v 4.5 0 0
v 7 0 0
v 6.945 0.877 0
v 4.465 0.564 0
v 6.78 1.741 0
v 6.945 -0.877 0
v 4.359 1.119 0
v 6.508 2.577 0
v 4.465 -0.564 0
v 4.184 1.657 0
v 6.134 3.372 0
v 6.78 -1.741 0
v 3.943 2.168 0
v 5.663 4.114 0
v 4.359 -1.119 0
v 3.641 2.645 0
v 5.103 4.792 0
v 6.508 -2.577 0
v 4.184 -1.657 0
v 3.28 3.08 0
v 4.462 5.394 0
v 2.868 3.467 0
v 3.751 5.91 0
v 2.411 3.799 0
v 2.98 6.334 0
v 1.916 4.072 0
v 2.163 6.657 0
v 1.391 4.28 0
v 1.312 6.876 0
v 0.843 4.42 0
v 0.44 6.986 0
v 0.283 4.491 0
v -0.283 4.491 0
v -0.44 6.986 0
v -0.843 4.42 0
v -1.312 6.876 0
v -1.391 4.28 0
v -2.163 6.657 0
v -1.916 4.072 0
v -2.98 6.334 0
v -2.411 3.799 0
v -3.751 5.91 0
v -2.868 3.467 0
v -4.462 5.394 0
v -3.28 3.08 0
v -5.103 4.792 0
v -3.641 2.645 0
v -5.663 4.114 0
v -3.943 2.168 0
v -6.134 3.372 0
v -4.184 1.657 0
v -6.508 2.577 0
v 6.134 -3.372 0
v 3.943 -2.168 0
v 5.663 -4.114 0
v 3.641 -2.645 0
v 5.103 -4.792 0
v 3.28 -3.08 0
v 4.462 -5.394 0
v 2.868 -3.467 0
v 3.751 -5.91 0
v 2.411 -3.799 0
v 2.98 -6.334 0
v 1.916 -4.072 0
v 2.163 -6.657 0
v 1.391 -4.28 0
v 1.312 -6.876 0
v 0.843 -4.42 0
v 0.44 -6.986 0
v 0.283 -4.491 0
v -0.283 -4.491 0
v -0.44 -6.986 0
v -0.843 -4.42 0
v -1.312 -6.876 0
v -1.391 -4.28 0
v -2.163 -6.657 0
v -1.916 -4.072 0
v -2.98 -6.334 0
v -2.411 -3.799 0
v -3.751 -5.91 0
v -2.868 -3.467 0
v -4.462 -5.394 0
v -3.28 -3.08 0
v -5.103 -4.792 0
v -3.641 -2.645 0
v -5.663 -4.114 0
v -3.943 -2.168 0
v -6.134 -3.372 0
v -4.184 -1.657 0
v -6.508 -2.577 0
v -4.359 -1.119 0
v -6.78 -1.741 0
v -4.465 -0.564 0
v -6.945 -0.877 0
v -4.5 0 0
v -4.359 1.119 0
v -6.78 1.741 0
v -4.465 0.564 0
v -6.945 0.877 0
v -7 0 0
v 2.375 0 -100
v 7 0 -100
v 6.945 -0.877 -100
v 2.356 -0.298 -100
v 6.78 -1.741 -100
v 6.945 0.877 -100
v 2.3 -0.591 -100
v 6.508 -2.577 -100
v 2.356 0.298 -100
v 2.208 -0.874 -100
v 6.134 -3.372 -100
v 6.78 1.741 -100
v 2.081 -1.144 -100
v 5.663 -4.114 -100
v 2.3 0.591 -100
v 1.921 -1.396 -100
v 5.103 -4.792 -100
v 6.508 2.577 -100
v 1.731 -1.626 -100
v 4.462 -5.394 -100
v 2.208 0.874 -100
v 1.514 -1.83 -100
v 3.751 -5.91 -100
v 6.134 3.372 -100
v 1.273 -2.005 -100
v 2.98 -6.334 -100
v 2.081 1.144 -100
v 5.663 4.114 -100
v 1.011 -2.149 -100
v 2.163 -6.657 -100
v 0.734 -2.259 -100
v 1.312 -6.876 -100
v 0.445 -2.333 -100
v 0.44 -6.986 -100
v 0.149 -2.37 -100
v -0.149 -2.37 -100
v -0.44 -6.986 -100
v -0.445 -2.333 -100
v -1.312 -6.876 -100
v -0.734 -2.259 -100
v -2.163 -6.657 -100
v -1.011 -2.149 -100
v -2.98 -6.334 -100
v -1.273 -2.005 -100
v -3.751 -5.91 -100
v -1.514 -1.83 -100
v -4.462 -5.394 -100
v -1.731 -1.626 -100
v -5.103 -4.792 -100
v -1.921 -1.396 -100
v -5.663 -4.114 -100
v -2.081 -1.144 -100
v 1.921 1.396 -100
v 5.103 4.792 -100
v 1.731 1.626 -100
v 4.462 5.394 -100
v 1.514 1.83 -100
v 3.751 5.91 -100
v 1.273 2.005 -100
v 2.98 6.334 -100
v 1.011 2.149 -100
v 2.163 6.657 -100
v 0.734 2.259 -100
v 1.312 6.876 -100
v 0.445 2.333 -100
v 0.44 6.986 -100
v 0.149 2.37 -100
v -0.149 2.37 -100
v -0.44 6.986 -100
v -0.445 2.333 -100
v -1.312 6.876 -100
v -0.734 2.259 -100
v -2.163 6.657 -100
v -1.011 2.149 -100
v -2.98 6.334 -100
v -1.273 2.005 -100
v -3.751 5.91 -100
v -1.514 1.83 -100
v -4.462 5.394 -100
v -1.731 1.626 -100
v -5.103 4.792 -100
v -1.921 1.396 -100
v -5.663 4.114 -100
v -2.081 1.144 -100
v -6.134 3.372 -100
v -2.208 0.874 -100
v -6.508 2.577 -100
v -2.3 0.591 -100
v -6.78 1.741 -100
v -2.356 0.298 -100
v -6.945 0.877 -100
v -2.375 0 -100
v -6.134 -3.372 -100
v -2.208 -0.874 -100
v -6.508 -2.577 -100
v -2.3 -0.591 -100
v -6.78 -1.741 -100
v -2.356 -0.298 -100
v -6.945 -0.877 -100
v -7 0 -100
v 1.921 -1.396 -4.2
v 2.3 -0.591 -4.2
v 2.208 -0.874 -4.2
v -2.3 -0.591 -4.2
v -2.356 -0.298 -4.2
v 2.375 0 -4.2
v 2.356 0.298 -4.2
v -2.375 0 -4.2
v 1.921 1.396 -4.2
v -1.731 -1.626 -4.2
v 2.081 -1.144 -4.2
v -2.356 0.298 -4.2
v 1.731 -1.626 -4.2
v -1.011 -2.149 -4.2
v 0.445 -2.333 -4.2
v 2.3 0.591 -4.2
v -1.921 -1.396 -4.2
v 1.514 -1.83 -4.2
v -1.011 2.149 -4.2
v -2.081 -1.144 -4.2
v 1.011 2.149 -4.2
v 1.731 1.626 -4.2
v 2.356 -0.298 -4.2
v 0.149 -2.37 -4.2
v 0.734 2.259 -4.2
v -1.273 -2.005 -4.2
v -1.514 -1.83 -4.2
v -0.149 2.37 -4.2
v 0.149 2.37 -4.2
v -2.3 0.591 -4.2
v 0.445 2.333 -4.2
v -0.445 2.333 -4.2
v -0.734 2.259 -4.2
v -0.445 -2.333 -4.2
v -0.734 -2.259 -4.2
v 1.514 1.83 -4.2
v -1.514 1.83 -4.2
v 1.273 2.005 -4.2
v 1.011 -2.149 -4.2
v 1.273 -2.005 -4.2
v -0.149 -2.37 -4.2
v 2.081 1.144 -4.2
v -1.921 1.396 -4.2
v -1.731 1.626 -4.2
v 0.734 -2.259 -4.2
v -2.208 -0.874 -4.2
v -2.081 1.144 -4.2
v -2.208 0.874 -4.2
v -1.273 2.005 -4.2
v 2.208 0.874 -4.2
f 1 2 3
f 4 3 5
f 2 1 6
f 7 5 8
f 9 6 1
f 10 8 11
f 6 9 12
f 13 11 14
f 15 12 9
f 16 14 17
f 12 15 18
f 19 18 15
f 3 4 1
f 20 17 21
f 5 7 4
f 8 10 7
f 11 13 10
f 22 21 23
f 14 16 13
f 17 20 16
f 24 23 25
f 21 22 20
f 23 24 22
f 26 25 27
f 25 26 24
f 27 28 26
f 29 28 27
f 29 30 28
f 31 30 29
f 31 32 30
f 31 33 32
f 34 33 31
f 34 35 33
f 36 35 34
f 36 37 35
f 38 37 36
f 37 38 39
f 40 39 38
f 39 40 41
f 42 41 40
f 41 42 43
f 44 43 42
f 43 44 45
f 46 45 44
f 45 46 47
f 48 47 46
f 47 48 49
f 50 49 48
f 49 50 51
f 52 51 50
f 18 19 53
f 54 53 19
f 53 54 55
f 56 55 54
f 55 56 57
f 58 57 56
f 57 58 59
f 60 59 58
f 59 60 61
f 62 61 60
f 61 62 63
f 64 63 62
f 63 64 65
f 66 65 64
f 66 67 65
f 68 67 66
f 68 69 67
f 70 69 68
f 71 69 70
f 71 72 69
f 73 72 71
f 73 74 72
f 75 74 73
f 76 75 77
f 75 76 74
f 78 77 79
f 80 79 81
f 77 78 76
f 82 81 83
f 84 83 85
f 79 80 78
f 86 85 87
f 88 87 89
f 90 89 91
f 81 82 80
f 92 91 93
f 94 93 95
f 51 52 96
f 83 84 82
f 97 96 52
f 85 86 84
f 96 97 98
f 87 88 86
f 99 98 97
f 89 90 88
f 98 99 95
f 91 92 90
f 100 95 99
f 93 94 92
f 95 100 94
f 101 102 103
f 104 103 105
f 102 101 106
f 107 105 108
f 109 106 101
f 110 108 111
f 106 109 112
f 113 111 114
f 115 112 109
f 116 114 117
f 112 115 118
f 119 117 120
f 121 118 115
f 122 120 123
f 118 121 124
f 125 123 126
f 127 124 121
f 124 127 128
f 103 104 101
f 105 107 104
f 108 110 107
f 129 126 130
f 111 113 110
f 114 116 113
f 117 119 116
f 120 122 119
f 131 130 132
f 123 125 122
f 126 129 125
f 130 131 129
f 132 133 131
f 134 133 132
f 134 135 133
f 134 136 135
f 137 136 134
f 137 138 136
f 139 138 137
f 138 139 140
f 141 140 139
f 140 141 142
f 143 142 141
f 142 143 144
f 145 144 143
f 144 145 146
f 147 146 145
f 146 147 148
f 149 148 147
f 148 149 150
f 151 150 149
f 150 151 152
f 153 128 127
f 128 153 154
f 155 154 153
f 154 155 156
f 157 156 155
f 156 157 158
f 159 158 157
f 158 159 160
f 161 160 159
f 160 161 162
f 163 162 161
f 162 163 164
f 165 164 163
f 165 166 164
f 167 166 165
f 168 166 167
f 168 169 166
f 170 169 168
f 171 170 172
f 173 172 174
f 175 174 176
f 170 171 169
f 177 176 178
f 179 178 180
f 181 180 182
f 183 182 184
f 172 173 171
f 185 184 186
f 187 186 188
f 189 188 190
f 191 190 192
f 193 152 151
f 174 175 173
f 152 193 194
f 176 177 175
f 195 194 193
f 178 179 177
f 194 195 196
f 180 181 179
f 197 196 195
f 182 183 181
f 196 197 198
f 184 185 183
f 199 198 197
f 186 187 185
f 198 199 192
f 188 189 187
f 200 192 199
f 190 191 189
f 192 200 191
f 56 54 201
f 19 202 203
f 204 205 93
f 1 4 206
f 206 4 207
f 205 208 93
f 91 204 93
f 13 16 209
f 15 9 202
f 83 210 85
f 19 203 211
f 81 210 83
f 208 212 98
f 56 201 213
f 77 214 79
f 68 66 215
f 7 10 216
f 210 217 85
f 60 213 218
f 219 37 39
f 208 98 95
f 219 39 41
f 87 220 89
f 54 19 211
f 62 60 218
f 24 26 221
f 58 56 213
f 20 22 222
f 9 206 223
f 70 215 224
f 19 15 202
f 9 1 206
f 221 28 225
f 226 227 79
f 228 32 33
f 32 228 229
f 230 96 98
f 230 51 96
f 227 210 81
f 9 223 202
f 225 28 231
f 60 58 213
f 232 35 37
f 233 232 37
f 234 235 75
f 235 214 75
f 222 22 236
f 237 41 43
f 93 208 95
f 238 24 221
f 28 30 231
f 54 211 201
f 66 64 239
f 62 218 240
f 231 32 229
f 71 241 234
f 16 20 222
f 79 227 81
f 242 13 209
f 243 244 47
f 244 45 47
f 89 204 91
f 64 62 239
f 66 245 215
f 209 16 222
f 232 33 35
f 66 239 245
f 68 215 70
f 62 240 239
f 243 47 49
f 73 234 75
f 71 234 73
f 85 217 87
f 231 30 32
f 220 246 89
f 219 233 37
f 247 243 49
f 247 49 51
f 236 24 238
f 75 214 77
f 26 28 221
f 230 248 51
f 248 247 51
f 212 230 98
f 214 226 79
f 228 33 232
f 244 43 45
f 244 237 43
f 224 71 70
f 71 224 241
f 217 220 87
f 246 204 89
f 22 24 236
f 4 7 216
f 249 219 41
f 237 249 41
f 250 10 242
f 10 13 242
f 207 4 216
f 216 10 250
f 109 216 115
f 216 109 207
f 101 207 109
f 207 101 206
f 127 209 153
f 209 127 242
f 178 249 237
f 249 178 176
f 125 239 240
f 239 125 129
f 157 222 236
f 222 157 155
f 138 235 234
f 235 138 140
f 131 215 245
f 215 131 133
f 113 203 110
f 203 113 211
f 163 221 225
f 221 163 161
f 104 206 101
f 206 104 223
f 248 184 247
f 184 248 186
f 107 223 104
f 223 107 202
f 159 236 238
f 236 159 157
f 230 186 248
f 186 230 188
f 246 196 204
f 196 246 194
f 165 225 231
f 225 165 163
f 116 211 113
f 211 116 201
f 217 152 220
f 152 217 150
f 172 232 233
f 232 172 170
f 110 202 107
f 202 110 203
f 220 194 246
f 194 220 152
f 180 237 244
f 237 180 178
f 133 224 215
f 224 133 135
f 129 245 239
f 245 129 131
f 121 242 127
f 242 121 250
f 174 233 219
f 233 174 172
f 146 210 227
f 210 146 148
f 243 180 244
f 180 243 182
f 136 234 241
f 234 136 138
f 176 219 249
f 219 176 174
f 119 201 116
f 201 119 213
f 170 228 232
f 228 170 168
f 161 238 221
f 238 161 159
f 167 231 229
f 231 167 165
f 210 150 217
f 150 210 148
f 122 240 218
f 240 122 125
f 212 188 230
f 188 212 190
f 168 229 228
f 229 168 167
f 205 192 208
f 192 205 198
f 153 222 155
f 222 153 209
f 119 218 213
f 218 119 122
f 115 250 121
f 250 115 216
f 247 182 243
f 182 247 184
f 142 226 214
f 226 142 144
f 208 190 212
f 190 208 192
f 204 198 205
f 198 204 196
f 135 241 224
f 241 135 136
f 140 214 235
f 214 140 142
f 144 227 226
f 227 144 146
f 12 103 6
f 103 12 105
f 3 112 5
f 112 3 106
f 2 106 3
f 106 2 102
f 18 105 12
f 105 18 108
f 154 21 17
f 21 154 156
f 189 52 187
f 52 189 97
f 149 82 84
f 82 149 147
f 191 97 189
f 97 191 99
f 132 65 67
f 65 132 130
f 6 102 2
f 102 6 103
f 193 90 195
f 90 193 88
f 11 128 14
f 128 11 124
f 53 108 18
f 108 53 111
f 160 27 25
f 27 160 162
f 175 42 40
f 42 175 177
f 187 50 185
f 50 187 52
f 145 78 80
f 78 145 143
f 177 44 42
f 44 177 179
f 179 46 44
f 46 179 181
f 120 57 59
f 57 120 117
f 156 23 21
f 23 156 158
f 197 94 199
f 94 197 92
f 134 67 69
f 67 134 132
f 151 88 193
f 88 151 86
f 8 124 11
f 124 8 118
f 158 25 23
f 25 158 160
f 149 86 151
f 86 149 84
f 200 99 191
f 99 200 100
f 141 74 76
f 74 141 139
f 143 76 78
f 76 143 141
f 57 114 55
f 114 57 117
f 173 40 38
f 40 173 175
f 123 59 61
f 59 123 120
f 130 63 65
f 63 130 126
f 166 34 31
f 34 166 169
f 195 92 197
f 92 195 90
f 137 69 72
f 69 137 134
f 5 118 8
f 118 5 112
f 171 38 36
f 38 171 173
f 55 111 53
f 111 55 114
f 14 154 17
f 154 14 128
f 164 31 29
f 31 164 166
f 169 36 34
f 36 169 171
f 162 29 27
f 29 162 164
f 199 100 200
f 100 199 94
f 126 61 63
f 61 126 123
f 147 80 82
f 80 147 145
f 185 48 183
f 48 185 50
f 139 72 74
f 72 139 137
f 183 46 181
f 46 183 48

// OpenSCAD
$fn = 50;


difference() {
	union() {
		translate(v = [0, 0, -100.0000000000]) {
			cylinder(h = 100, r = 7.0000000000);
		}
	}
	union() {
		translate(v = [0, 0, 0]) {
			rotate(a = [0, 0, 0]) {
				difference() {
					union() {
						#translate(v = [0, 0, -100.0000000000]) {
							cylinder(h = 100, r = 2.2500000000);
						}
						#translate(v = [0, 0, -4.2000000000]) {
							cylinder(h = 4.2000000000, r1 = 2.3750000000, r2 = 4.5000000000);
						}
						#translate(v = [0, 0, -100.0000000000]) {
							cylinder(h = 100, r = 2.3750000000);
						}
						#translate(v = [0, 0, -100.0000000000]) {
							cylinder(h = 100, r = 2.2500000000);
						}
					}
					union();
				}
			}
		}
	}
}
